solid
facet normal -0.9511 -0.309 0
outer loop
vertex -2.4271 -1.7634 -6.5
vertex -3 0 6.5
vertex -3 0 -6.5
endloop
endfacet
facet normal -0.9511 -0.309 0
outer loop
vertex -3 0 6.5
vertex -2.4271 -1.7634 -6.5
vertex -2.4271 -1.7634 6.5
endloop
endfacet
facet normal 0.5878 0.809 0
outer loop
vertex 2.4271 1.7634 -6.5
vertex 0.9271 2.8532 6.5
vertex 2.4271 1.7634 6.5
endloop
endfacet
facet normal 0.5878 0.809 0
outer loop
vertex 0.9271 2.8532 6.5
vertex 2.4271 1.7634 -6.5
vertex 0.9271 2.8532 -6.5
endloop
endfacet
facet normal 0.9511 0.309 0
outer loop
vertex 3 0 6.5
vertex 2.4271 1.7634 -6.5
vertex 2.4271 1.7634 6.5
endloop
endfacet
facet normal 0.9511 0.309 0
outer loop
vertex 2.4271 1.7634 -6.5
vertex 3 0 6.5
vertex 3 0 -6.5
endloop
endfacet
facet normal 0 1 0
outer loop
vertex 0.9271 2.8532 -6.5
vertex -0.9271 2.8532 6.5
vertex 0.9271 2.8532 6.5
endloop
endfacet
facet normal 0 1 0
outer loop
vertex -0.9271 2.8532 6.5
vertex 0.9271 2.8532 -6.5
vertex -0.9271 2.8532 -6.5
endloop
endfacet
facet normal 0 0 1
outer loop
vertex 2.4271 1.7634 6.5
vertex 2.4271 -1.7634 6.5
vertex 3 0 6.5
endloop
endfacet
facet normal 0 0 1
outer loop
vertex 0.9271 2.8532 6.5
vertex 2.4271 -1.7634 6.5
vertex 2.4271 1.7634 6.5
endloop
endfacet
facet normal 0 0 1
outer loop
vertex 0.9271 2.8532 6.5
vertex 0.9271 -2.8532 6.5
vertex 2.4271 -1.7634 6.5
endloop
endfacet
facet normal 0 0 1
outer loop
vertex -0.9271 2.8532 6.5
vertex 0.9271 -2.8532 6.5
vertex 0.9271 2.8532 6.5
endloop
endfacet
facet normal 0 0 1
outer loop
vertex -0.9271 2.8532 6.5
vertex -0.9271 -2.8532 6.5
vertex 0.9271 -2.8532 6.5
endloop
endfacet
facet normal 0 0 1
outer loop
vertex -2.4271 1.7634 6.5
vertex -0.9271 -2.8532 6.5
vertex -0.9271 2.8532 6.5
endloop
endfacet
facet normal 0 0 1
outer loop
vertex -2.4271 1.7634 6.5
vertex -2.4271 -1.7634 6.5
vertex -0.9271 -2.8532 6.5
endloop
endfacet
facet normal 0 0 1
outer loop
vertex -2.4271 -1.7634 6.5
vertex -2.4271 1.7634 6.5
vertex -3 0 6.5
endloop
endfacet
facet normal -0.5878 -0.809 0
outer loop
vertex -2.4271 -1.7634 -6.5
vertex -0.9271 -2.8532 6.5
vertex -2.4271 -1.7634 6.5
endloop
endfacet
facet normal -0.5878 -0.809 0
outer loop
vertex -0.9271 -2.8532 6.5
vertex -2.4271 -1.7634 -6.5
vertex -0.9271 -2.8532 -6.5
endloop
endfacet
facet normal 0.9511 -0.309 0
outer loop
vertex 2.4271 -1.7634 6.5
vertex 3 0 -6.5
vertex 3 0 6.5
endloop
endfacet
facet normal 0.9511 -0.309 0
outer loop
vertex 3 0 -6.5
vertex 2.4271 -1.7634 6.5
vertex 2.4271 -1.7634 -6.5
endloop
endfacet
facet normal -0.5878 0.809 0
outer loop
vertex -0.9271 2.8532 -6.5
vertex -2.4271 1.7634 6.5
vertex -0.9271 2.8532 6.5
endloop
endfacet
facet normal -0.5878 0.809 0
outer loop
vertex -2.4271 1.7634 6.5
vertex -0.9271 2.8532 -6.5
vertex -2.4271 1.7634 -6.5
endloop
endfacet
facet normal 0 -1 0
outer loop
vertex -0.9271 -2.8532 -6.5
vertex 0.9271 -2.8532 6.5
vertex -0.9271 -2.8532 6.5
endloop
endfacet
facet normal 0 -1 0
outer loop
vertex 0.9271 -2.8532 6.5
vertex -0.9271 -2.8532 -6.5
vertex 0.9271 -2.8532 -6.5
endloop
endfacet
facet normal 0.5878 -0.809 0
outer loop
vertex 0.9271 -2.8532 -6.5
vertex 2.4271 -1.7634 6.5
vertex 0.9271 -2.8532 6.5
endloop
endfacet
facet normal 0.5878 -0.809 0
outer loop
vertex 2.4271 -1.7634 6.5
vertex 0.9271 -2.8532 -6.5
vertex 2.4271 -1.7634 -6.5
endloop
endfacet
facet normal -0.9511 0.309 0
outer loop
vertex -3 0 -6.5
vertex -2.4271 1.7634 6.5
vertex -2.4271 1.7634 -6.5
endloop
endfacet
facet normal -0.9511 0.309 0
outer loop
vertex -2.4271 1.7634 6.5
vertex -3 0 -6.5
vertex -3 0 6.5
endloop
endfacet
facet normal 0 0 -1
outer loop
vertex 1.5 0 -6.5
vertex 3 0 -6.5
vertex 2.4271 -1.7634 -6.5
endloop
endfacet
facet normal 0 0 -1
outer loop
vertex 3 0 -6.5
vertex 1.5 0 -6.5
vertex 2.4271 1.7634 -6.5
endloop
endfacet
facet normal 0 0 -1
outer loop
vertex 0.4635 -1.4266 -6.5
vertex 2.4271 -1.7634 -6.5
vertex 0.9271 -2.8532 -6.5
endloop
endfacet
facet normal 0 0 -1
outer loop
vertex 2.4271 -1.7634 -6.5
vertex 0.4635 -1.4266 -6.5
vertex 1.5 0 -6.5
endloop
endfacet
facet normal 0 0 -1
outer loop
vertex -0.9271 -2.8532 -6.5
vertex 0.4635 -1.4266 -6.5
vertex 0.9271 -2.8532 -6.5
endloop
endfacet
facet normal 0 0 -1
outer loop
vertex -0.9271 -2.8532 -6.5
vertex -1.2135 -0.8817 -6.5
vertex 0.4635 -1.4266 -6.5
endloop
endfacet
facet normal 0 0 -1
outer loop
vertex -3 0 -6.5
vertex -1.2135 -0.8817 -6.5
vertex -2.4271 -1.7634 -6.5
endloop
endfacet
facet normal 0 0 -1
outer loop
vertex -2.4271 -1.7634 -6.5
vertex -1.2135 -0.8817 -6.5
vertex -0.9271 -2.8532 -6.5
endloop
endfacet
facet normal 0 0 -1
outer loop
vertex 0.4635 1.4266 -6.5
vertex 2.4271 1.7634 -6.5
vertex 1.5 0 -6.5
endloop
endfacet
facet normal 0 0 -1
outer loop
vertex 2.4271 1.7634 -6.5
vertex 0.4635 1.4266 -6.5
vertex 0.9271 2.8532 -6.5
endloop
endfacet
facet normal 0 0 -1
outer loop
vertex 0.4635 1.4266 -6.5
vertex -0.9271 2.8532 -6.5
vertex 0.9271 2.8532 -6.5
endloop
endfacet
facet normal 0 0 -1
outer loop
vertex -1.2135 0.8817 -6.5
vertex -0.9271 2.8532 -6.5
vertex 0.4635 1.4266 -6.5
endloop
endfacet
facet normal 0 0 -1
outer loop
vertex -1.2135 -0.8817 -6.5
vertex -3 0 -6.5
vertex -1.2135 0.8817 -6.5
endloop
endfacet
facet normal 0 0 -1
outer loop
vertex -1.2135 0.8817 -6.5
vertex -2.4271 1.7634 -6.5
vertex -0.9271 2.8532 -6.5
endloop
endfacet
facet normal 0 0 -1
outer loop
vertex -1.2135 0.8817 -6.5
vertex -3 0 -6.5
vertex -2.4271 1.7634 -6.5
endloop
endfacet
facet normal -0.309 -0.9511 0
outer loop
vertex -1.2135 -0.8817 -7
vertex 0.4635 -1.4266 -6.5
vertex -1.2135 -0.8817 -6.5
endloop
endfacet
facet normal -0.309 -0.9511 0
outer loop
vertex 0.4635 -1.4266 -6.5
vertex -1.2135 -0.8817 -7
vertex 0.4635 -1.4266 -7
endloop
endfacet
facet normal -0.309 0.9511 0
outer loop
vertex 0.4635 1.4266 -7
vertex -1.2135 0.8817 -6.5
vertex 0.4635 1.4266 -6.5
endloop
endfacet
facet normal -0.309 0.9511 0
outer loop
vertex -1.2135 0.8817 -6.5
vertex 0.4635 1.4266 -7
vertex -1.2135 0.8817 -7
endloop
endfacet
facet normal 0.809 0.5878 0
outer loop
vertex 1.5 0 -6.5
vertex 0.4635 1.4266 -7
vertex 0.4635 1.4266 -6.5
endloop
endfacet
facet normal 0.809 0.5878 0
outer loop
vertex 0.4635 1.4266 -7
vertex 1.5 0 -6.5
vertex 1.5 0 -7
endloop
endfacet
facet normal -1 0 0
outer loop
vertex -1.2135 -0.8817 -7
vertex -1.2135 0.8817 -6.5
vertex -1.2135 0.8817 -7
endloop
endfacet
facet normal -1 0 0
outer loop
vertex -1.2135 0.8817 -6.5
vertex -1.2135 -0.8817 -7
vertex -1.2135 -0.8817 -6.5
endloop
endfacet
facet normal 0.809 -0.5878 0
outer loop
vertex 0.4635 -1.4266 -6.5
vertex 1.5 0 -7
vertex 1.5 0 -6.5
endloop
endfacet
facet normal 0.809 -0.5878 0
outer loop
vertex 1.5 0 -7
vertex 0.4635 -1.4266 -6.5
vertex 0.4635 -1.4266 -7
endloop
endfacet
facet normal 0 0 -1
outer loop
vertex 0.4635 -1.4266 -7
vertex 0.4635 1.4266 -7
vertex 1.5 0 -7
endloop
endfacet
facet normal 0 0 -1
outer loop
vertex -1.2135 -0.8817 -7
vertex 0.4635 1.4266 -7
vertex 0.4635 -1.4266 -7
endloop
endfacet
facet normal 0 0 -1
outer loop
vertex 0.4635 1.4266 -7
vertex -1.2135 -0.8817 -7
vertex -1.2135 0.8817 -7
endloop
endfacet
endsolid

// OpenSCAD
// Parameters
thread_diameter_mm = 3.0; //[1.5:6.0:0.1]
length_mm = 13.0; //[6.5:26.0:0.5]
outer_diameter_mm = 6.0; //[3.5:12.0:0.5]
top_thread_length_mm = 13.0; //[3.0:13.0:0.5]
bottom_thread_length_mm = 0.0; //[0.0:13.0:0.5]
overlap_mm = 1.0; //[0.5:2.0:0.1]

// Standoff - complete geometry
module standoff() {
  color("Silver") {
    // Main body
    cylinder(h=length_mm, r=outer_diameter_mm/2, center=true);
    
    // Top threaded interface
    translate([0, 0, (length_mm/2 - top_thread_length_mm/2) - overlap_mm/2])
      cylinder(h=top_thread_length_mm, r=thread_diameter_mm/2, center=true);
    
    // Bottom threaded interface (not visible as length is 0)
    if (bottom_thread_length_mm > 0) {
      translate([0, 0, (-length_mm/2 + bottom_thread_length_mm/2) + overlap_mm/2])
        cylinder(h=bottom_thread_length_mm, r=thread_diameter_mm/2, center=true);
    }
  }
}

// Pillar - complete geometry
module pillar() {
  // For this example, the pillar is the same as the standoff
  standoff();
}

// Assembly
module assembly() {
  pillar();
}

assembly();
